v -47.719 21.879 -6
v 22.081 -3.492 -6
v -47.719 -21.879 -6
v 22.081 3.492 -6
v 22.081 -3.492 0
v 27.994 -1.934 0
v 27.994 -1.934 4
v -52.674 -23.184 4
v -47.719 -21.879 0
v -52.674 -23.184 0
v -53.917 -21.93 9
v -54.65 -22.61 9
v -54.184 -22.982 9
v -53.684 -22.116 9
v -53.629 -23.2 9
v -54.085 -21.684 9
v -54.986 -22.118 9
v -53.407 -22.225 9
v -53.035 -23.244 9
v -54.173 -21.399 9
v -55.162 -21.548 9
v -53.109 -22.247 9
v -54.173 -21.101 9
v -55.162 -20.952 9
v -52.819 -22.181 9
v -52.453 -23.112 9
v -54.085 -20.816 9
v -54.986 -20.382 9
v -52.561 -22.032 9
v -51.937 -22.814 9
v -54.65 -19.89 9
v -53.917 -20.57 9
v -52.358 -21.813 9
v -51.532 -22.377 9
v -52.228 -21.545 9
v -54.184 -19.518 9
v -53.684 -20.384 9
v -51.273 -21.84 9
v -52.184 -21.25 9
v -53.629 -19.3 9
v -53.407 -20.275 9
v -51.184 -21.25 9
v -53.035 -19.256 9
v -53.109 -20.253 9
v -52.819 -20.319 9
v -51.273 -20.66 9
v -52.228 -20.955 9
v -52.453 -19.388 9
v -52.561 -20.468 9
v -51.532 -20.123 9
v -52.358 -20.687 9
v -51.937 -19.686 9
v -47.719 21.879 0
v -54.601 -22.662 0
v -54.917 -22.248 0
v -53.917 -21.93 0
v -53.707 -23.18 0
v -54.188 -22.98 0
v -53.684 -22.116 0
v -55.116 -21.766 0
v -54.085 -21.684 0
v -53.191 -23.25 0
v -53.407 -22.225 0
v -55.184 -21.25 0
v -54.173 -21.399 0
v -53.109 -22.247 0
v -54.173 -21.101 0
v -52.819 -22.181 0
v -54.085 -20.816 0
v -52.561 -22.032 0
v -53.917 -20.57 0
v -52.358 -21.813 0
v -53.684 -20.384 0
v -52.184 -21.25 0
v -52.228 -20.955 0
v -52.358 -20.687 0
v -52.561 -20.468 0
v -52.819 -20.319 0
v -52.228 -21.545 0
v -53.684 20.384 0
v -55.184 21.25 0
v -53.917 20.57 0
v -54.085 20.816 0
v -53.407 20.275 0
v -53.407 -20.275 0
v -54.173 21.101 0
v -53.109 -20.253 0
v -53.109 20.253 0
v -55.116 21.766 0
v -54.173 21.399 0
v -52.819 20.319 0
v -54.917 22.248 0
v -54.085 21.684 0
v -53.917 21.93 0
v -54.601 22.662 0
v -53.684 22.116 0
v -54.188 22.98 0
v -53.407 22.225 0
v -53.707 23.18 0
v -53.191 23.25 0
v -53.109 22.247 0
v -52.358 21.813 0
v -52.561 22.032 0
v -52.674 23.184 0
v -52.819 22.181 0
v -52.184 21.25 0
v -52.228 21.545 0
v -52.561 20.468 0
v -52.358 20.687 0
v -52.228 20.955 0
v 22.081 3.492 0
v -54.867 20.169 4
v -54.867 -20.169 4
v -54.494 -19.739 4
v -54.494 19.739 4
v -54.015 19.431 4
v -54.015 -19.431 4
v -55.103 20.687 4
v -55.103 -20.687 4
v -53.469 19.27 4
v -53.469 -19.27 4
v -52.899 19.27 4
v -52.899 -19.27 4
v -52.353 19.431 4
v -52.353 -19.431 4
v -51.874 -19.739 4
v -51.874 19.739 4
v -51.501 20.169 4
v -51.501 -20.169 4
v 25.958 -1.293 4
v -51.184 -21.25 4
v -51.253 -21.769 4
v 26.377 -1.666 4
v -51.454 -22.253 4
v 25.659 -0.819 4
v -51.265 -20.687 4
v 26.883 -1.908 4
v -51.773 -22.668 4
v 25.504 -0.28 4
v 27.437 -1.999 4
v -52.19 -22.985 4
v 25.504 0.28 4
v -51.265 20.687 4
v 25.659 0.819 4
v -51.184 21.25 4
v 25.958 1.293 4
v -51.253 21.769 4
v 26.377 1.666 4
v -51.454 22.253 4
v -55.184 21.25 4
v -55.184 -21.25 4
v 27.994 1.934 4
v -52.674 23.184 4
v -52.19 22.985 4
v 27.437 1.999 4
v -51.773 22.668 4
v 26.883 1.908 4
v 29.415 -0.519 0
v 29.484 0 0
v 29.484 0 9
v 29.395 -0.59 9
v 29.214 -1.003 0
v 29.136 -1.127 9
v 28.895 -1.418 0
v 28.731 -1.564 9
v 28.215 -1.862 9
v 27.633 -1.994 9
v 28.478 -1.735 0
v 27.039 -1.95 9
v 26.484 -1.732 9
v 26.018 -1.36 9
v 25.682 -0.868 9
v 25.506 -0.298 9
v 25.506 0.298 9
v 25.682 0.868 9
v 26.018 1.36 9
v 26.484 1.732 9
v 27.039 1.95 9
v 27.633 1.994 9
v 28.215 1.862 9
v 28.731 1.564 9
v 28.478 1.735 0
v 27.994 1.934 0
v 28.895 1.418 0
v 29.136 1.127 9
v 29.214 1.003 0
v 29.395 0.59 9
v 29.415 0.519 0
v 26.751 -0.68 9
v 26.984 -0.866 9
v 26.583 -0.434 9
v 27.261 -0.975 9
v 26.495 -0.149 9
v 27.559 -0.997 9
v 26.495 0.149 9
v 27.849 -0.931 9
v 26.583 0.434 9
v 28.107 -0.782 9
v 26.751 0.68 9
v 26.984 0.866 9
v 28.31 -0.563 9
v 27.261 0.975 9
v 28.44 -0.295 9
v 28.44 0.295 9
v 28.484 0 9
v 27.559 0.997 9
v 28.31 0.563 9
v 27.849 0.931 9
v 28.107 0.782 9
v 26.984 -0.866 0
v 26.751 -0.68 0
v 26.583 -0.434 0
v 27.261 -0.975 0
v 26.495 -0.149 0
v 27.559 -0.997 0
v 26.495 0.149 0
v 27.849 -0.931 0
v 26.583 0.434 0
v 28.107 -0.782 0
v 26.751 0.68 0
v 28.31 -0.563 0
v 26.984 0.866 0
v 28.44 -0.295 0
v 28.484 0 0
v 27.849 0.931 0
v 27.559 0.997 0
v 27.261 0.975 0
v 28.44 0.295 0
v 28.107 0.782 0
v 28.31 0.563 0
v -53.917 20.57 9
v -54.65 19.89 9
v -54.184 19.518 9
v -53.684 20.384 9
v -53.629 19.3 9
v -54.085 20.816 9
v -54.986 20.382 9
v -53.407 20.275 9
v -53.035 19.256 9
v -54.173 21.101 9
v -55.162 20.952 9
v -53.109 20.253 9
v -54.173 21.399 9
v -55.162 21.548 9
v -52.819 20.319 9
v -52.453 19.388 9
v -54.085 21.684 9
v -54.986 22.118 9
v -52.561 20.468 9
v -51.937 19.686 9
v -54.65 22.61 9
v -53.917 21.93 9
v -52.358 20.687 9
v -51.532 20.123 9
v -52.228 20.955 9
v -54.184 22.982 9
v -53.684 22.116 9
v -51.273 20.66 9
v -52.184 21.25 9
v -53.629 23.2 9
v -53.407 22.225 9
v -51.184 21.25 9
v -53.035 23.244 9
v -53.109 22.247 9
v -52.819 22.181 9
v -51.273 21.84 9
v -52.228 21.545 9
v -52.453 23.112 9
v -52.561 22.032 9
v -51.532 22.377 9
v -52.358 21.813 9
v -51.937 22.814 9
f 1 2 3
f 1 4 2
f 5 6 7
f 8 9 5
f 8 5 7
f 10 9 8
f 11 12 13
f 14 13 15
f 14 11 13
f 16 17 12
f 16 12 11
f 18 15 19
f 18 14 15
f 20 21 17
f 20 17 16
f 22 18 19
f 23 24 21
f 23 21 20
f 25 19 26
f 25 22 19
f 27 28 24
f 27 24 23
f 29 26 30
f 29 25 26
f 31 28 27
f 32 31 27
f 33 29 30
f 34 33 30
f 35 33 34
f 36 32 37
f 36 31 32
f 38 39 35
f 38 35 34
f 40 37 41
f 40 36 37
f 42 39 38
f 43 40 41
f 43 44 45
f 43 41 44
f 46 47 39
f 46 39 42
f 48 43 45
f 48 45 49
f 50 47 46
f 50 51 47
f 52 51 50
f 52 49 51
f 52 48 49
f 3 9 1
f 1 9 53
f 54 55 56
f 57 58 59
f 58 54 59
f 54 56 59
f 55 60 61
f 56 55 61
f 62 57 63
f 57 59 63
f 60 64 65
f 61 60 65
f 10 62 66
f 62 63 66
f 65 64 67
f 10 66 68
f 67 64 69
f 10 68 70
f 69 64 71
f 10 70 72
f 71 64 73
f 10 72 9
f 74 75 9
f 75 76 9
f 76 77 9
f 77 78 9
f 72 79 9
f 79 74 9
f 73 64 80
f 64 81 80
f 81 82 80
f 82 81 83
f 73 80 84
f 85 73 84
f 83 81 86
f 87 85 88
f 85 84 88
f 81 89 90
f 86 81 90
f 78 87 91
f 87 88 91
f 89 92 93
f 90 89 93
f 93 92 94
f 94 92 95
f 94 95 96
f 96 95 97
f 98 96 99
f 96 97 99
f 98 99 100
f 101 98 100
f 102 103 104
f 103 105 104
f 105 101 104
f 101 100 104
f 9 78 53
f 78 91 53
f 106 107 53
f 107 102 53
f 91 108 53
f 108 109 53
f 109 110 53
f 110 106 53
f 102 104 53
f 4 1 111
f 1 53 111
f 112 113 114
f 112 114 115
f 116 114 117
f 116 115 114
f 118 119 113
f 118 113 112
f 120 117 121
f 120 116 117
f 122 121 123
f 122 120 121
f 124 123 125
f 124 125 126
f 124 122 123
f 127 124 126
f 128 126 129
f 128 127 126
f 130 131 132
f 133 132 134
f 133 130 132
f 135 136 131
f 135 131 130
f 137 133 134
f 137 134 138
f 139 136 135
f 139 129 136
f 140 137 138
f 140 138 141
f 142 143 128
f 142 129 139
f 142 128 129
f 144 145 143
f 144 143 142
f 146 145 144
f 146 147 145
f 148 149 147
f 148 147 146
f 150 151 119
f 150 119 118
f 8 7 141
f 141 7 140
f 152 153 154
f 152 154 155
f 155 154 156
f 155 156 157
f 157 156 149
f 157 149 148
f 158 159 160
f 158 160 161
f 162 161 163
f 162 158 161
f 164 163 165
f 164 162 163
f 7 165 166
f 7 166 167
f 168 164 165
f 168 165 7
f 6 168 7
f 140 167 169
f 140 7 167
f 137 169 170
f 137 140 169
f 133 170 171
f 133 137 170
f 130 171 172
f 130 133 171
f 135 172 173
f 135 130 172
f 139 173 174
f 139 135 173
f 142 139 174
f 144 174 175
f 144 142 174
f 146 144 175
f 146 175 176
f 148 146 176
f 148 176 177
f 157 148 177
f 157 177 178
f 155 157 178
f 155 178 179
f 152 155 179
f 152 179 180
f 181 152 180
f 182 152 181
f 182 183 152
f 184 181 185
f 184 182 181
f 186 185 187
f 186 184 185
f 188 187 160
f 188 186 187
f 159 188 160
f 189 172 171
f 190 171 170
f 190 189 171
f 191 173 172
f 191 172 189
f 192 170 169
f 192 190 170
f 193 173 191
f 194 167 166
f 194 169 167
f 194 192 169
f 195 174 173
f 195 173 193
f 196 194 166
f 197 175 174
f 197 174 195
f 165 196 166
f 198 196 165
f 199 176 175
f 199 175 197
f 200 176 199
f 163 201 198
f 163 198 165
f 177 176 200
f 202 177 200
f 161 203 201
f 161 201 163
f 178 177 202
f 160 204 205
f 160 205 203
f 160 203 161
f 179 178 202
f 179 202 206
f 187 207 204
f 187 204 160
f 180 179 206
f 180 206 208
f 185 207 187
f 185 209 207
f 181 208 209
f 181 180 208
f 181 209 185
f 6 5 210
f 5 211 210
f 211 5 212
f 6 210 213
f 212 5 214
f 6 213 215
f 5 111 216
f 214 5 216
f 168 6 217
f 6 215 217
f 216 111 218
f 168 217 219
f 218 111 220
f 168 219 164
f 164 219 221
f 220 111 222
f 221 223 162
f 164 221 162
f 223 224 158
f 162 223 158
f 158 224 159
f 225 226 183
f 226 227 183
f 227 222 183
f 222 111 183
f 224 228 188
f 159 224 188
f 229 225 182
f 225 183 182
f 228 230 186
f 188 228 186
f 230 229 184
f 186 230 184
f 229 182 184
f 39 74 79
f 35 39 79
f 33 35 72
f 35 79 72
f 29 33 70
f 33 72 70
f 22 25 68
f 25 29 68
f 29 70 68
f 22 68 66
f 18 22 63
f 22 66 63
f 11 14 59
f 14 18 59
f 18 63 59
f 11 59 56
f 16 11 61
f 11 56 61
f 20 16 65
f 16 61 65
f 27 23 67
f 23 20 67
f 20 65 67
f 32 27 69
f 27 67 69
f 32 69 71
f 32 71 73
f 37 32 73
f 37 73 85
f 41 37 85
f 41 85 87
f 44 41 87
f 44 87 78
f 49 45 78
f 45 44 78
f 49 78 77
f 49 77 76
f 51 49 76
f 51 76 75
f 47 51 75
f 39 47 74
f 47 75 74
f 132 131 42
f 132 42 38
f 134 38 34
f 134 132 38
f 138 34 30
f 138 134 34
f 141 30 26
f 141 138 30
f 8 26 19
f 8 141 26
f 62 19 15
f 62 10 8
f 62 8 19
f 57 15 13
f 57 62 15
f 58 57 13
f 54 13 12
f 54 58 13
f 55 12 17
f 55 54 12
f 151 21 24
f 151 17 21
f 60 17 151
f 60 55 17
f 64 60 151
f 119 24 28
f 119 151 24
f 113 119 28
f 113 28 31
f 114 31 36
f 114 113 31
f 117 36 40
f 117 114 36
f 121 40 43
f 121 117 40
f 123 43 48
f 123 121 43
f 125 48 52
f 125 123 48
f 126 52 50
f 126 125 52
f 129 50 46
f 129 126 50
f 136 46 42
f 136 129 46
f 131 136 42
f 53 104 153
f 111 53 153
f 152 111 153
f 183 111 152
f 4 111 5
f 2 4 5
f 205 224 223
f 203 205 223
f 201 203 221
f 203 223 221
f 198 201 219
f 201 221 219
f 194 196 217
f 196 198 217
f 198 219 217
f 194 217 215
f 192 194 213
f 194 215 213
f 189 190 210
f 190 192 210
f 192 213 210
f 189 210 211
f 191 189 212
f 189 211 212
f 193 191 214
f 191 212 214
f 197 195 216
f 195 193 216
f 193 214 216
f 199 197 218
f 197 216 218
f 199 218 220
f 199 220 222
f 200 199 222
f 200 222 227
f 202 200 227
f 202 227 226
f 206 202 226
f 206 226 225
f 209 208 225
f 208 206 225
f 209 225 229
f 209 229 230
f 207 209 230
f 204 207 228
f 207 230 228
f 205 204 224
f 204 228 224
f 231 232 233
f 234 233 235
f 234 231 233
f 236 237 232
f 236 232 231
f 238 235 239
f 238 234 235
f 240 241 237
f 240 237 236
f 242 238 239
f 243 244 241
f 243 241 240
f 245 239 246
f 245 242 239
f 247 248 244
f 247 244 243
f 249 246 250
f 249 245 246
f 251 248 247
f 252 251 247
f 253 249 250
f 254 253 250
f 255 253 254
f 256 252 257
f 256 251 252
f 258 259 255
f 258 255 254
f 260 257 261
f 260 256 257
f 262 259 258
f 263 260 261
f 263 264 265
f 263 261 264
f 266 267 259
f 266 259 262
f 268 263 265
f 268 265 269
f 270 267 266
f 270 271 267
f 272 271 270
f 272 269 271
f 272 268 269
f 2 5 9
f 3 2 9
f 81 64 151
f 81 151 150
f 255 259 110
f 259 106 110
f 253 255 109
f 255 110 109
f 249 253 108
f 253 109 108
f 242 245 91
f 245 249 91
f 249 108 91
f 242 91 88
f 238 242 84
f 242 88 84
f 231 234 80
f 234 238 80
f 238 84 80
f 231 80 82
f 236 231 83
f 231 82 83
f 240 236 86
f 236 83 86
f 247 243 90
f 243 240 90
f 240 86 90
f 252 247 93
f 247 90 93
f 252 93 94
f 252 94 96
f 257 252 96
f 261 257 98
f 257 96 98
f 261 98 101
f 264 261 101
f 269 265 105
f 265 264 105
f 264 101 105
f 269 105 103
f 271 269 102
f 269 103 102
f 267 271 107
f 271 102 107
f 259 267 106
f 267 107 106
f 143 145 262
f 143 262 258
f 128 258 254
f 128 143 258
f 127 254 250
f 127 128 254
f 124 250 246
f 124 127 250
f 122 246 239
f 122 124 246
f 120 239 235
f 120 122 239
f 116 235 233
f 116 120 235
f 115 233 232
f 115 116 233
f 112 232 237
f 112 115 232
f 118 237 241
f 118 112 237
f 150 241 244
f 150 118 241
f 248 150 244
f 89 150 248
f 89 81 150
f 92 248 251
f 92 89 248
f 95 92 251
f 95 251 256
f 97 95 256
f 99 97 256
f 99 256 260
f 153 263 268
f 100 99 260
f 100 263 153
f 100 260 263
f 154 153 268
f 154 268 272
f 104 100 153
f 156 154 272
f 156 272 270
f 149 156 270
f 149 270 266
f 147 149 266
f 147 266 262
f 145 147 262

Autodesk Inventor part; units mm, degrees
ref_plane "YZ Plane" through (0, 0, 0) normal (1, 0, 0) x (0, 1, 0)
ref_plane "XZ Plane" through (0, 0, 0) normal (0, 1, 0) x (-1, 0, 0)
sketch "Sketch1" plane through (0, 0, 0) normal (0, 0, 1) x (1, 0, 0)
  circle A0 centre (-53.184, -21.25) radius 1.5 projected
  arc A1 (-60.184, 31.25) -> (-62.184, 29.25) centre (-60.184, 29.25) ccw projected
  line L0 (-62.184, -29.25) -> (-62.184, 29.25) projected
  arc A2 (-62.184, -29.25) -> (-60.184, -31.25) centre (-60.184, -29.25) ccw projected
  line L1 (-47.8192, -31.25) -> (-60.184, -31.25) projected
  line L2 (-47.8192, -31.25) -> (-47.8192, 31.25) projected
  line L3 (-47.8192, 31.25) -> (-60.184, 31.25) projected
  circle A3 centre (-53.184, 21.25) radius 1.5 projected
  circle A4 centre (27.484, 0) radius 1.5 projected
  circle A5 centre (-53.184, 21.25) radius 2
  circle A6 centre (-53.184, 21.25) radius 1 projected
  circle A7 centre (-53.184, -21.25) radius 1 projected
  circle A8 centre (-53.184, -21.25) radius 2
  circle A9 centre (27.484, 0) radius 2
  circle A10 centre (27.484, 0) radius 1 projected
  line L4 (-52.6745, 23.184) -> (27.9935, 1.934)
  line L5 (27.9935, -1.934) -> (-52.6745, -23.184)
  line L6 (-55.184, -21.25) -> (-55.184, 21.25)
  arc A11 (-52.6745, 23.184) -> (-55.184, 21.25) centre (-53.184, 21.25) ccw
  arc A12 (-55.184, -21.25) -> (-52.6745, -23.184) centre (-53.184, -21.25) ccw
  arc A13 (27.9935, -1.934) -> (27.9935, 1.934) centre (27.484, 0) ccw
  point P0 (0, 0)
  dimension "d0" = 4
  dimension "d1" = 4
  dimension "d2" = 4
  dimension "d3" = 2
extrude "Extrusion1" add sketch "Sketch1" along normal blind 9 contours A0 | A5 | A9 | A8 | A3 | A4
extrude "Extrusion2" add sketch "Sketch1" along normal blind 4 contours L4 A9 L5 L2 | L2 L5 A8 L6 A5 L4
sketch "Sketch2" plane through (0, 0, 0) normal (0, 0, -1) x (-1, 0, 0)
  line L0 (-22.1808, 31.25) -> (-22.1808, -31.25) projected
  line L1 (47.8192, 31.25) -> (-22.1808, 31.25) projected
  line L2 (47.8192, -31.25) -> (47.8192, 31.25) projected
  line L3 (-22.1808, -31.25) -> (47.8192, -31.25) projected
  line L4 (47.8192, -21.905) -> (47.8192, 21.905)
  line L5 (47.8192, 21.905) -> (-22.1808, 3.4652)
  line L6 (-22.1808, 3.4652) -> (-22.1808, -3.4652)
  line L7 (-22.1808, -3.4652) -> (47.8192, -21.905)
  line L8 (52.6745, 23.184) -> (-27.9935, 1.934) projected
  line L9 (-27.9935, -1.934) -> (52.6745, -23.184) projected
  line L10 (47.7192, -21.8787) -> (47.7192, 21.8787)
  line L11 (47.7192, 21.7753) -> (-22.0808, 3.3882)
  line L12 (-22.0808, 3.4916) -> (-22.0808, -3.4916)
  line L13 (-22.0808, -3.3882) -> (47.7192, -21.7753)
  line L14 (47.7192, 21.7753) -> (47.7192, 21.8787)
  line L15 (-22.0808, 3.3882) -> (-22.0808, 3.4916)
  line L16 (47.8192, 21.905) -> (-22.1808, 3.4652)
  point P0 (0, 0)
  point P1 (-22.1808, 0)
  dimension "d8" = 0.1
  dimension "d11" = 0.1
  dimension "d12" = 0.1
  dimension "d13" = 0.1
ref_plane "Work Plane1" through (-47.8192, -31.25, -6) normal (0, 0, 1) x (1, 0, 0)
extrude "Extrusion3" add sketch "Sketch2" along normal up to surface (6 mm away) contours L5 L10 L11 L12 | L12 L13 L10 L7 | L11 L10 L13 L12
properties part number "3d_LM-Welding_Tooling - Top Adapter" material "PA12 SLS 3D Print"
